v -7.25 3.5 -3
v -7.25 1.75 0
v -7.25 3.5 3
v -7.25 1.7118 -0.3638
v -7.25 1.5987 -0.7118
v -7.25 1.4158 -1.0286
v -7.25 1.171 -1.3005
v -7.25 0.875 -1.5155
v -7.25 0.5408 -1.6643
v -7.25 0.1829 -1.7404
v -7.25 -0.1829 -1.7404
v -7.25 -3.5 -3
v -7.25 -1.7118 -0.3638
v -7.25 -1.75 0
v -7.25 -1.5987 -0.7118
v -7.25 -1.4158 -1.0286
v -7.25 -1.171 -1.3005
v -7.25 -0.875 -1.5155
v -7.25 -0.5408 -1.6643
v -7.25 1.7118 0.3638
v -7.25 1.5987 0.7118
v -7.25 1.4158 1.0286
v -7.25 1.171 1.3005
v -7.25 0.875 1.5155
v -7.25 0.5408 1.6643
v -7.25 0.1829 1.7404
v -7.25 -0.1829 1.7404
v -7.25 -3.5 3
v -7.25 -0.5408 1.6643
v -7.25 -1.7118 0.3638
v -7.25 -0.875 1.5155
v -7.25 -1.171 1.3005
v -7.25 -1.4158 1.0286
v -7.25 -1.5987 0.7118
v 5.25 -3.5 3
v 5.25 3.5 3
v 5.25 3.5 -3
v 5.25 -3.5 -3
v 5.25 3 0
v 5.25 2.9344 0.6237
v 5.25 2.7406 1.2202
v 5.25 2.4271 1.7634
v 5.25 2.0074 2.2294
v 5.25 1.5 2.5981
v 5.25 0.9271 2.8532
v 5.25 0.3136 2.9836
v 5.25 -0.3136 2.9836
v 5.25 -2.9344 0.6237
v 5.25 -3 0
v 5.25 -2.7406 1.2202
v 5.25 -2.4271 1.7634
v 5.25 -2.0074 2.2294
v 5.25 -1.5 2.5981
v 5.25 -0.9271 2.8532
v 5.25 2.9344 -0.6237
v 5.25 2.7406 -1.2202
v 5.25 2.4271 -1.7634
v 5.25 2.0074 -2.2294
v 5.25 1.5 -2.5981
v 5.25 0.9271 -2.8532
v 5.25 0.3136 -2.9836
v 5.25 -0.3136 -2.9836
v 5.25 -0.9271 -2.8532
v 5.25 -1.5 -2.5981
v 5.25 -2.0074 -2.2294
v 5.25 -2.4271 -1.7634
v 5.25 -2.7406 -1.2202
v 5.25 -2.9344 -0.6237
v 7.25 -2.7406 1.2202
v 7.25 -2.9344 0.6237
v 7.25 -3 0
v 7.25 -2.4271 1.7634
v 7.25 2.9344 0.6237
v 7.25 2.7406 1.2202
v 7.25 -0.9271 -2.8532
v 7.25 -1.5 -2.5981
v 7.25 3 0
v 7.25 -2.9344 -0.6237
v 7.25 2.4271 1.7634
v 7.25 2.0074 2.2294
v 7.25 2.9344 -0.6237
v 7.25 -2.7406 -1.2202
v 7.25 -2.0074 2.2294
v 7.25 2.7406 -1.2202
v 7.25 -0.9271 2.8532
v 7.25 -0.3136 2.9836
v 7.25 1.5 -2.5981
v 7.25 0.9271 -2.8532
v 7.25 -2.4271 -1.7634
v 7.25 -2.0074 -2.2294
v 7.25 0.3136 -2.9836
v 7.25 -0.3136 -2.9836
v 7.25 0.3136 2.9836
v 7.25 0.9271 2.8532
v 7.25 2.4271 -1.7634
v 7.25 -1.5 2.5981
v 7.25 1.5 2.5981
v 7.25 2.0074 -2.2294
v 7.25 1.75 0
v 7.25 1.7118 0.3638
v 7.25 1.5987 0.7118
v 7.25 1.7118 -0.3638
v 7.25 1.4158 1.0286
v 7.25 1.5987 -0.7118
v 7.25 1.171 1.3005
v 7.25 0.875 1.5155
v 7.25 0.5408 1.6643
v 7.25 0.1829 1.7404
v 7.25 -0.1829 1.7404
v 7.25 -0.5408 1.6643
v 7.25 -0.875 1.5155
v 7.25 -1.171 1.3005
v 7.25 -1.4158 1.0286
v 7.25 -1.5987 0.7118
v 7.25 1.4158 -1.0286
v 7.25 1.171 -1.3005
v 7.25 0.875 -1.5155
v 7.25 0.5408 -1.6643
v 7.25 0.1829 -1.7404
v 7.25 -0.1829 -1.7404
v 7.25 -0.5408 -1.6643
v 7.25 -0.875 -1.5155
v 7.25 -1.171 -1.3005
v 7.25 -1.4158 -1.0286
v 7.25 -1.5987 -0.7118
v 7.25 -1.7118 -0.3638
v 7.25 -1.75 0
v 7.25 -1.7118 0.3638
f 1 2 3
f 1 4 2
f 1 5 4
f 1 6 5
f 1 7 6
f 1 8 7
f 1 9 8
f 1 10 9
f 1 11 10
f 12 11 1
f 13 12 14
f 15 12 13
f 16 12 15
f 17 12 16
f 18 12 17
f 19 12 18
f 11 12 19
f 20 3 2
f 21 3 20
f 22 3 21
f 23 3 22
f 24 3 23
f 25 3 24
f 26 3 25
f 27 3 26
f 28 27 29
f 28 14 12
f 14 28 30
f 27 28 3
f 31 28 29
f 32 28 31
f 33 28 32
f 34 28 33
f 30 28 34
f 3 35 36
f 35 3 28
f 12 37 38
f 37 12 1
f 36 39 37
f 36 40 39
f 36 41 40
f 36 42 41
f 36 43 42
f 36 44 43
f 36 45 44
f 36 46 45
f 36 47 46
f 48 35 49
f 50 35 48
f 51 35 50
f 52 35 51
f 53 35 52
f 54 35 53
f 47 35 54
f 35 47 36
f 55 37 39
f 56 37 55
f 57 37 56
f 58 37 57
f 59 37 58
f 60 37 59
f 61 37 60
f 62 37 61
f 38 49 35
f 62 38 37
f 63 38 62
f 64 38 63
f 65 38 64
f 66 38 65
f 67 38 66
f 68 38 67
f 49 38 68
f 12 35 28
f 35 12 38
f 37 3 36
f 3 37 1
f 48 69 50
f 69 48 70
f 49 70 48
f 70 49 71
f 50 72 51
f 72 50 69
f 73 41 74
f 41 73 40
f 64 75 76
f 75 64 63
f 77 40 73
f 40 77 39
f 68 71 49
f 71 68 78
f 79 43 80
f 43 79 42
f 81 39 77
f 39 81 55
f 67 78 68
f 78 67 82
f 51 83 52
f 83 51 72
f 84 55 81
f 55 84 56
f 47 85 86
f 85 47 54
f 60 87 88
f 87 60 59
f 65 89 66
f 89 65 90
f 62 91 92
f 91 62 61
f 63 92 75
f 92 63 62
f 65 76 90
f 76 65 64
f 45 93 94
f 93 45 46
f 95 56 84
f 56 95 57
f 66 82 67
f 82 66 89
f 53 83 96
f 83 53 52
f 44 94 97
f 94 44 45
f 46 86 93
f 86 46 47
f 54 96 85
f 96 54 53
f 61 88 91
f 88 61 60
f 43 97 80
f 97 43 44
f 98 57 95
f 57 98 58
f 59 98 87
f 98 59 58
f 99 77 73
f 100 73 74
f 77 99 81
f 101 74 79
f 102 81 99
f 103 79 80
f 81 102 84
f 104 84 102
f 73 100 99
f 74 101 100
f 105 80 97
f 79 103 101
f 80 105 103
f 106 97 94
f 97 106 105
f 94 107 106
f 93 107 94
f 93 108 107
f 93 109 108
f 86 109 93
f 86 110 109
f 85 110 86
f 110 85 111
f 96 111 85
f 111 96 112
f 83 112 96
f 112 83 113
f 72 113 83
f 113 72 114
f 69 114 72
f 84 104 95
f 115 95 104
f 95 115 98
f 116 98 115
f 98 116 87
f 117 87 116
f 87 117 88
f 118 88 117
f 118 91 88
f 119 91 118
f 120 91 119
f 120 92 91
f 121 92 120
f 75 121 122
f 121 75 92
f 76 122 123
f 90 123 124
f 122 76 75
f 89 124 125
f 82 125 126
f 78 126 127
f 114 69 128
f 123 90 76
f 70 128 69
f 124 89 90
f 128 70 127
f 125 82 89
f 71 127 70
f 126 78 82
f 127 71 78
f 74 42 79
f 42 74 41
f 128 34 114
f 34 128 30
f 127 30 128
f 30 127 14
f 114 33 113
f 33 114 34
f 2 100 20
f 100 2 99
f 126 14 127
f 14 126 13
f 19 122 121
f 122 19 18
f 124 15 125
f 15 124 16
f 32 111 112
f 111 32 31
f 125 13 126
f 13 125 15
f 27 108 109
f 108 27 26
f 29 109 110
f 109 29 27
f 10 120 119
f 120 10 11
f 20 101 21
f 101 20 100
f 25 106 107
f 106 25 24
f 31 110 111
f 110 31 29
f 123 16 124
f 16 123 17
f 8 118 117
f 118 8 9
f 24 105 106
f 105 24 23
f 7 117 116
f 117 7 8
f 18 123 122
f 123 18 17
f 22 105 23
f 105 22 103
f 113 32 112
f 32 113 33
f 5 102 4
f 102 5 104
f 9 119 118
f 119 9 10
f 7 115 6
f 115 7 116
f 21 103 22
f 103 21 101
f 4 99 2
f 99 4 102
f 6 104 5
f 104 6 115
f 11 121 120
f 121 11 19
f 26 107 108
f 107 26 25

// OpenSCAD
// file: ../globals.scad
// Copyright (c) 2017 Clément Bœsch <u pkh.me>
//
// Permission to use, copy, modify, and distribute this software for any
// purpose with or without fee is hereby granted, provided that the above
// copyright notice and this permission notice appear in all copies.
//
// THE SOFTWARE IS PROVIDED "AS IS" AND THE AUTHOR DISCLAIMS ALL WARRANTIES
// WITH REGARD TO THIS SOFTWARE INCLUDING ALL IMPLIED WARRANTIES OF
// MERCHANTABILITY AND FITNESS. IN NO EVENT SHALL THE AUTHOR BE LIABLE FOR
// ANY SPECIAL, DIRECT, INDIRECT, OR CONSEQUENTIAL DAMAGES OR ANY DAMAGES
// WHATSOEVER RESULTING FROM LOSS OF USE, DATA OR PROFITS, WHETHER IN AN
// ACTION OF CONTRACT, NEGLIGENCE OR OTHER TORTIOUS ACTION, ARISING OUT OF
// OR IN CONNECTION WITH THE USE OR PERFORMANCE OF THIS SOFTWARE.

$fn = 30;

_delta = 0.005;

c_black        = [.17,.17,.17];
c_black_redish = [.35,.30,.30];
c_gold         = [.75,.55,.00];
c_gray         = [.40,.40,.40];
c_darkgray     = [.25,.25,.25];
c_green_pcb    = [.00,.50,.25];
c_metal        = [.70,.70,.70];
c_yellow       = [.70,.70,.30];
c_darkblue     = [.20,.30,.40];
// file: _internal.scad
// Copyright (c) 2017 Clément Bœsch <u pkh.me>
//
// Permission to use, copy, modify, and distribute this software for any
// purpose with or without fee is hereby granted, provided that the above
// copyright notice and this permission notice appear in all copies.
//
// THE SOFTWARE IS PROVIDED "AS IS" AND THE AUTHOR DISCLAIMS ALL WARRANTIES
// WITH REGARD TO THIS SOFTWARE INCLUDING ALL IMPLIED WARRANTIES OF
// MERCHANTABILITY AND FITNESS. IN NO EVENT SHALL THE AUTHOR BE LIABLE FOR
// ANY SPECIAL, DIRECT, INDIRECT, OR CONSEQUENTIAL DAMAGES OR ANY DAMAGES
// WHATSOEVER RESULTING FROM LOSS OF USE, DATA OR PROFITS, WHETHER IN AN
// ACTION OF CONTRACT, NEGLIGENCE OR OTHER TORTIOUS ACTION, ARISING OUT OF
// OR IN CONNECTION WITH THE USE OR PERFORMANCE OF THIS SOFTWARE.

include <../globals.scad>

$vpr = [50, 0, 90];

module components_demo(pad=30) {
    n = $children;
    cols = ceil(sqrt(n));
    rows = ceil(n / cols);
    offx = pad * (rows - 1) / 2;
    offy = pad * (cols - 1) / 2;
    for (i = [0:n-1]) {
        x = floor(i / cols);
        y = i % cols;
        translate([x*pad - offx, y*pad - offy])
            rotate(360 * $t)
                children(i);
    }
}
// main file
// Copyright (c) 2017 Clément Bœsch <u pkh.me>
//
// Permission to use, copy, modify, and distribute this software for any
// purpose with or without fee is hereby granted, provided that the above
// copyright notice and this permission notice appear in all copies.
//
// THE SOFTWARE IS PROVIDED "AS IS" AND THE AUTHOR DISCLAIMS ALL WARRANTIES
// WITH REGARD TO THIS SOFTWARE INCLUDING ALL IMPLIED WARRANTIES OF
// MERCHANTABILITY AND FITNESS. IN NO EVENT SHALL THE AUTHOR BE LIABLE FOR
// ANY SPECIAL, DIRECT, INDIRECT, OR CONSEQUENTIAL DAMAGES OR ANY DAMAGES
// WHATSOEVER RESULTING FROM LOSS OF USE, DATA OR PROFITS, WHETHER IN AN
// ACTION OF CONTRACT, NEGLIGENCE OR OTHER TORTIOUS ACTION, ARISING OUT OF
// OR IN CONNECTION WITH THE USE OR PERFORMANCE OF THIS SOFTWARE.

include <_internal.scad>

$vpd = 100;

module jack(dim=[14.5, 7, 6]) {
    l = dim[0];
    w = dim[1];
    h = dim[2];

    lcyl = 2;
    rotate([0, 0, 180])
    translate(dim * -.5) { // XXX
        color(c_black) {
            difference() {
                union() {
                    translate([lcyl, 0, 0])
                        cube([l-lcyl, w, h]);
                    translate([0, w/2, h/2])
                        rotate([90, 0, 90])
                            cylinder(d=h, h=lcyl);
                }
                translate([-_delta/2, w/2, h/2])
                    rotate([90, 0, 90])
                        cylinder(d=3.5, h=l+_delta);
            }
        }
    }
}

function jack_info() = [
    ["category", "jack"],
    ["watch", "horizon"],
];

components_demo() {
    jack();
}
